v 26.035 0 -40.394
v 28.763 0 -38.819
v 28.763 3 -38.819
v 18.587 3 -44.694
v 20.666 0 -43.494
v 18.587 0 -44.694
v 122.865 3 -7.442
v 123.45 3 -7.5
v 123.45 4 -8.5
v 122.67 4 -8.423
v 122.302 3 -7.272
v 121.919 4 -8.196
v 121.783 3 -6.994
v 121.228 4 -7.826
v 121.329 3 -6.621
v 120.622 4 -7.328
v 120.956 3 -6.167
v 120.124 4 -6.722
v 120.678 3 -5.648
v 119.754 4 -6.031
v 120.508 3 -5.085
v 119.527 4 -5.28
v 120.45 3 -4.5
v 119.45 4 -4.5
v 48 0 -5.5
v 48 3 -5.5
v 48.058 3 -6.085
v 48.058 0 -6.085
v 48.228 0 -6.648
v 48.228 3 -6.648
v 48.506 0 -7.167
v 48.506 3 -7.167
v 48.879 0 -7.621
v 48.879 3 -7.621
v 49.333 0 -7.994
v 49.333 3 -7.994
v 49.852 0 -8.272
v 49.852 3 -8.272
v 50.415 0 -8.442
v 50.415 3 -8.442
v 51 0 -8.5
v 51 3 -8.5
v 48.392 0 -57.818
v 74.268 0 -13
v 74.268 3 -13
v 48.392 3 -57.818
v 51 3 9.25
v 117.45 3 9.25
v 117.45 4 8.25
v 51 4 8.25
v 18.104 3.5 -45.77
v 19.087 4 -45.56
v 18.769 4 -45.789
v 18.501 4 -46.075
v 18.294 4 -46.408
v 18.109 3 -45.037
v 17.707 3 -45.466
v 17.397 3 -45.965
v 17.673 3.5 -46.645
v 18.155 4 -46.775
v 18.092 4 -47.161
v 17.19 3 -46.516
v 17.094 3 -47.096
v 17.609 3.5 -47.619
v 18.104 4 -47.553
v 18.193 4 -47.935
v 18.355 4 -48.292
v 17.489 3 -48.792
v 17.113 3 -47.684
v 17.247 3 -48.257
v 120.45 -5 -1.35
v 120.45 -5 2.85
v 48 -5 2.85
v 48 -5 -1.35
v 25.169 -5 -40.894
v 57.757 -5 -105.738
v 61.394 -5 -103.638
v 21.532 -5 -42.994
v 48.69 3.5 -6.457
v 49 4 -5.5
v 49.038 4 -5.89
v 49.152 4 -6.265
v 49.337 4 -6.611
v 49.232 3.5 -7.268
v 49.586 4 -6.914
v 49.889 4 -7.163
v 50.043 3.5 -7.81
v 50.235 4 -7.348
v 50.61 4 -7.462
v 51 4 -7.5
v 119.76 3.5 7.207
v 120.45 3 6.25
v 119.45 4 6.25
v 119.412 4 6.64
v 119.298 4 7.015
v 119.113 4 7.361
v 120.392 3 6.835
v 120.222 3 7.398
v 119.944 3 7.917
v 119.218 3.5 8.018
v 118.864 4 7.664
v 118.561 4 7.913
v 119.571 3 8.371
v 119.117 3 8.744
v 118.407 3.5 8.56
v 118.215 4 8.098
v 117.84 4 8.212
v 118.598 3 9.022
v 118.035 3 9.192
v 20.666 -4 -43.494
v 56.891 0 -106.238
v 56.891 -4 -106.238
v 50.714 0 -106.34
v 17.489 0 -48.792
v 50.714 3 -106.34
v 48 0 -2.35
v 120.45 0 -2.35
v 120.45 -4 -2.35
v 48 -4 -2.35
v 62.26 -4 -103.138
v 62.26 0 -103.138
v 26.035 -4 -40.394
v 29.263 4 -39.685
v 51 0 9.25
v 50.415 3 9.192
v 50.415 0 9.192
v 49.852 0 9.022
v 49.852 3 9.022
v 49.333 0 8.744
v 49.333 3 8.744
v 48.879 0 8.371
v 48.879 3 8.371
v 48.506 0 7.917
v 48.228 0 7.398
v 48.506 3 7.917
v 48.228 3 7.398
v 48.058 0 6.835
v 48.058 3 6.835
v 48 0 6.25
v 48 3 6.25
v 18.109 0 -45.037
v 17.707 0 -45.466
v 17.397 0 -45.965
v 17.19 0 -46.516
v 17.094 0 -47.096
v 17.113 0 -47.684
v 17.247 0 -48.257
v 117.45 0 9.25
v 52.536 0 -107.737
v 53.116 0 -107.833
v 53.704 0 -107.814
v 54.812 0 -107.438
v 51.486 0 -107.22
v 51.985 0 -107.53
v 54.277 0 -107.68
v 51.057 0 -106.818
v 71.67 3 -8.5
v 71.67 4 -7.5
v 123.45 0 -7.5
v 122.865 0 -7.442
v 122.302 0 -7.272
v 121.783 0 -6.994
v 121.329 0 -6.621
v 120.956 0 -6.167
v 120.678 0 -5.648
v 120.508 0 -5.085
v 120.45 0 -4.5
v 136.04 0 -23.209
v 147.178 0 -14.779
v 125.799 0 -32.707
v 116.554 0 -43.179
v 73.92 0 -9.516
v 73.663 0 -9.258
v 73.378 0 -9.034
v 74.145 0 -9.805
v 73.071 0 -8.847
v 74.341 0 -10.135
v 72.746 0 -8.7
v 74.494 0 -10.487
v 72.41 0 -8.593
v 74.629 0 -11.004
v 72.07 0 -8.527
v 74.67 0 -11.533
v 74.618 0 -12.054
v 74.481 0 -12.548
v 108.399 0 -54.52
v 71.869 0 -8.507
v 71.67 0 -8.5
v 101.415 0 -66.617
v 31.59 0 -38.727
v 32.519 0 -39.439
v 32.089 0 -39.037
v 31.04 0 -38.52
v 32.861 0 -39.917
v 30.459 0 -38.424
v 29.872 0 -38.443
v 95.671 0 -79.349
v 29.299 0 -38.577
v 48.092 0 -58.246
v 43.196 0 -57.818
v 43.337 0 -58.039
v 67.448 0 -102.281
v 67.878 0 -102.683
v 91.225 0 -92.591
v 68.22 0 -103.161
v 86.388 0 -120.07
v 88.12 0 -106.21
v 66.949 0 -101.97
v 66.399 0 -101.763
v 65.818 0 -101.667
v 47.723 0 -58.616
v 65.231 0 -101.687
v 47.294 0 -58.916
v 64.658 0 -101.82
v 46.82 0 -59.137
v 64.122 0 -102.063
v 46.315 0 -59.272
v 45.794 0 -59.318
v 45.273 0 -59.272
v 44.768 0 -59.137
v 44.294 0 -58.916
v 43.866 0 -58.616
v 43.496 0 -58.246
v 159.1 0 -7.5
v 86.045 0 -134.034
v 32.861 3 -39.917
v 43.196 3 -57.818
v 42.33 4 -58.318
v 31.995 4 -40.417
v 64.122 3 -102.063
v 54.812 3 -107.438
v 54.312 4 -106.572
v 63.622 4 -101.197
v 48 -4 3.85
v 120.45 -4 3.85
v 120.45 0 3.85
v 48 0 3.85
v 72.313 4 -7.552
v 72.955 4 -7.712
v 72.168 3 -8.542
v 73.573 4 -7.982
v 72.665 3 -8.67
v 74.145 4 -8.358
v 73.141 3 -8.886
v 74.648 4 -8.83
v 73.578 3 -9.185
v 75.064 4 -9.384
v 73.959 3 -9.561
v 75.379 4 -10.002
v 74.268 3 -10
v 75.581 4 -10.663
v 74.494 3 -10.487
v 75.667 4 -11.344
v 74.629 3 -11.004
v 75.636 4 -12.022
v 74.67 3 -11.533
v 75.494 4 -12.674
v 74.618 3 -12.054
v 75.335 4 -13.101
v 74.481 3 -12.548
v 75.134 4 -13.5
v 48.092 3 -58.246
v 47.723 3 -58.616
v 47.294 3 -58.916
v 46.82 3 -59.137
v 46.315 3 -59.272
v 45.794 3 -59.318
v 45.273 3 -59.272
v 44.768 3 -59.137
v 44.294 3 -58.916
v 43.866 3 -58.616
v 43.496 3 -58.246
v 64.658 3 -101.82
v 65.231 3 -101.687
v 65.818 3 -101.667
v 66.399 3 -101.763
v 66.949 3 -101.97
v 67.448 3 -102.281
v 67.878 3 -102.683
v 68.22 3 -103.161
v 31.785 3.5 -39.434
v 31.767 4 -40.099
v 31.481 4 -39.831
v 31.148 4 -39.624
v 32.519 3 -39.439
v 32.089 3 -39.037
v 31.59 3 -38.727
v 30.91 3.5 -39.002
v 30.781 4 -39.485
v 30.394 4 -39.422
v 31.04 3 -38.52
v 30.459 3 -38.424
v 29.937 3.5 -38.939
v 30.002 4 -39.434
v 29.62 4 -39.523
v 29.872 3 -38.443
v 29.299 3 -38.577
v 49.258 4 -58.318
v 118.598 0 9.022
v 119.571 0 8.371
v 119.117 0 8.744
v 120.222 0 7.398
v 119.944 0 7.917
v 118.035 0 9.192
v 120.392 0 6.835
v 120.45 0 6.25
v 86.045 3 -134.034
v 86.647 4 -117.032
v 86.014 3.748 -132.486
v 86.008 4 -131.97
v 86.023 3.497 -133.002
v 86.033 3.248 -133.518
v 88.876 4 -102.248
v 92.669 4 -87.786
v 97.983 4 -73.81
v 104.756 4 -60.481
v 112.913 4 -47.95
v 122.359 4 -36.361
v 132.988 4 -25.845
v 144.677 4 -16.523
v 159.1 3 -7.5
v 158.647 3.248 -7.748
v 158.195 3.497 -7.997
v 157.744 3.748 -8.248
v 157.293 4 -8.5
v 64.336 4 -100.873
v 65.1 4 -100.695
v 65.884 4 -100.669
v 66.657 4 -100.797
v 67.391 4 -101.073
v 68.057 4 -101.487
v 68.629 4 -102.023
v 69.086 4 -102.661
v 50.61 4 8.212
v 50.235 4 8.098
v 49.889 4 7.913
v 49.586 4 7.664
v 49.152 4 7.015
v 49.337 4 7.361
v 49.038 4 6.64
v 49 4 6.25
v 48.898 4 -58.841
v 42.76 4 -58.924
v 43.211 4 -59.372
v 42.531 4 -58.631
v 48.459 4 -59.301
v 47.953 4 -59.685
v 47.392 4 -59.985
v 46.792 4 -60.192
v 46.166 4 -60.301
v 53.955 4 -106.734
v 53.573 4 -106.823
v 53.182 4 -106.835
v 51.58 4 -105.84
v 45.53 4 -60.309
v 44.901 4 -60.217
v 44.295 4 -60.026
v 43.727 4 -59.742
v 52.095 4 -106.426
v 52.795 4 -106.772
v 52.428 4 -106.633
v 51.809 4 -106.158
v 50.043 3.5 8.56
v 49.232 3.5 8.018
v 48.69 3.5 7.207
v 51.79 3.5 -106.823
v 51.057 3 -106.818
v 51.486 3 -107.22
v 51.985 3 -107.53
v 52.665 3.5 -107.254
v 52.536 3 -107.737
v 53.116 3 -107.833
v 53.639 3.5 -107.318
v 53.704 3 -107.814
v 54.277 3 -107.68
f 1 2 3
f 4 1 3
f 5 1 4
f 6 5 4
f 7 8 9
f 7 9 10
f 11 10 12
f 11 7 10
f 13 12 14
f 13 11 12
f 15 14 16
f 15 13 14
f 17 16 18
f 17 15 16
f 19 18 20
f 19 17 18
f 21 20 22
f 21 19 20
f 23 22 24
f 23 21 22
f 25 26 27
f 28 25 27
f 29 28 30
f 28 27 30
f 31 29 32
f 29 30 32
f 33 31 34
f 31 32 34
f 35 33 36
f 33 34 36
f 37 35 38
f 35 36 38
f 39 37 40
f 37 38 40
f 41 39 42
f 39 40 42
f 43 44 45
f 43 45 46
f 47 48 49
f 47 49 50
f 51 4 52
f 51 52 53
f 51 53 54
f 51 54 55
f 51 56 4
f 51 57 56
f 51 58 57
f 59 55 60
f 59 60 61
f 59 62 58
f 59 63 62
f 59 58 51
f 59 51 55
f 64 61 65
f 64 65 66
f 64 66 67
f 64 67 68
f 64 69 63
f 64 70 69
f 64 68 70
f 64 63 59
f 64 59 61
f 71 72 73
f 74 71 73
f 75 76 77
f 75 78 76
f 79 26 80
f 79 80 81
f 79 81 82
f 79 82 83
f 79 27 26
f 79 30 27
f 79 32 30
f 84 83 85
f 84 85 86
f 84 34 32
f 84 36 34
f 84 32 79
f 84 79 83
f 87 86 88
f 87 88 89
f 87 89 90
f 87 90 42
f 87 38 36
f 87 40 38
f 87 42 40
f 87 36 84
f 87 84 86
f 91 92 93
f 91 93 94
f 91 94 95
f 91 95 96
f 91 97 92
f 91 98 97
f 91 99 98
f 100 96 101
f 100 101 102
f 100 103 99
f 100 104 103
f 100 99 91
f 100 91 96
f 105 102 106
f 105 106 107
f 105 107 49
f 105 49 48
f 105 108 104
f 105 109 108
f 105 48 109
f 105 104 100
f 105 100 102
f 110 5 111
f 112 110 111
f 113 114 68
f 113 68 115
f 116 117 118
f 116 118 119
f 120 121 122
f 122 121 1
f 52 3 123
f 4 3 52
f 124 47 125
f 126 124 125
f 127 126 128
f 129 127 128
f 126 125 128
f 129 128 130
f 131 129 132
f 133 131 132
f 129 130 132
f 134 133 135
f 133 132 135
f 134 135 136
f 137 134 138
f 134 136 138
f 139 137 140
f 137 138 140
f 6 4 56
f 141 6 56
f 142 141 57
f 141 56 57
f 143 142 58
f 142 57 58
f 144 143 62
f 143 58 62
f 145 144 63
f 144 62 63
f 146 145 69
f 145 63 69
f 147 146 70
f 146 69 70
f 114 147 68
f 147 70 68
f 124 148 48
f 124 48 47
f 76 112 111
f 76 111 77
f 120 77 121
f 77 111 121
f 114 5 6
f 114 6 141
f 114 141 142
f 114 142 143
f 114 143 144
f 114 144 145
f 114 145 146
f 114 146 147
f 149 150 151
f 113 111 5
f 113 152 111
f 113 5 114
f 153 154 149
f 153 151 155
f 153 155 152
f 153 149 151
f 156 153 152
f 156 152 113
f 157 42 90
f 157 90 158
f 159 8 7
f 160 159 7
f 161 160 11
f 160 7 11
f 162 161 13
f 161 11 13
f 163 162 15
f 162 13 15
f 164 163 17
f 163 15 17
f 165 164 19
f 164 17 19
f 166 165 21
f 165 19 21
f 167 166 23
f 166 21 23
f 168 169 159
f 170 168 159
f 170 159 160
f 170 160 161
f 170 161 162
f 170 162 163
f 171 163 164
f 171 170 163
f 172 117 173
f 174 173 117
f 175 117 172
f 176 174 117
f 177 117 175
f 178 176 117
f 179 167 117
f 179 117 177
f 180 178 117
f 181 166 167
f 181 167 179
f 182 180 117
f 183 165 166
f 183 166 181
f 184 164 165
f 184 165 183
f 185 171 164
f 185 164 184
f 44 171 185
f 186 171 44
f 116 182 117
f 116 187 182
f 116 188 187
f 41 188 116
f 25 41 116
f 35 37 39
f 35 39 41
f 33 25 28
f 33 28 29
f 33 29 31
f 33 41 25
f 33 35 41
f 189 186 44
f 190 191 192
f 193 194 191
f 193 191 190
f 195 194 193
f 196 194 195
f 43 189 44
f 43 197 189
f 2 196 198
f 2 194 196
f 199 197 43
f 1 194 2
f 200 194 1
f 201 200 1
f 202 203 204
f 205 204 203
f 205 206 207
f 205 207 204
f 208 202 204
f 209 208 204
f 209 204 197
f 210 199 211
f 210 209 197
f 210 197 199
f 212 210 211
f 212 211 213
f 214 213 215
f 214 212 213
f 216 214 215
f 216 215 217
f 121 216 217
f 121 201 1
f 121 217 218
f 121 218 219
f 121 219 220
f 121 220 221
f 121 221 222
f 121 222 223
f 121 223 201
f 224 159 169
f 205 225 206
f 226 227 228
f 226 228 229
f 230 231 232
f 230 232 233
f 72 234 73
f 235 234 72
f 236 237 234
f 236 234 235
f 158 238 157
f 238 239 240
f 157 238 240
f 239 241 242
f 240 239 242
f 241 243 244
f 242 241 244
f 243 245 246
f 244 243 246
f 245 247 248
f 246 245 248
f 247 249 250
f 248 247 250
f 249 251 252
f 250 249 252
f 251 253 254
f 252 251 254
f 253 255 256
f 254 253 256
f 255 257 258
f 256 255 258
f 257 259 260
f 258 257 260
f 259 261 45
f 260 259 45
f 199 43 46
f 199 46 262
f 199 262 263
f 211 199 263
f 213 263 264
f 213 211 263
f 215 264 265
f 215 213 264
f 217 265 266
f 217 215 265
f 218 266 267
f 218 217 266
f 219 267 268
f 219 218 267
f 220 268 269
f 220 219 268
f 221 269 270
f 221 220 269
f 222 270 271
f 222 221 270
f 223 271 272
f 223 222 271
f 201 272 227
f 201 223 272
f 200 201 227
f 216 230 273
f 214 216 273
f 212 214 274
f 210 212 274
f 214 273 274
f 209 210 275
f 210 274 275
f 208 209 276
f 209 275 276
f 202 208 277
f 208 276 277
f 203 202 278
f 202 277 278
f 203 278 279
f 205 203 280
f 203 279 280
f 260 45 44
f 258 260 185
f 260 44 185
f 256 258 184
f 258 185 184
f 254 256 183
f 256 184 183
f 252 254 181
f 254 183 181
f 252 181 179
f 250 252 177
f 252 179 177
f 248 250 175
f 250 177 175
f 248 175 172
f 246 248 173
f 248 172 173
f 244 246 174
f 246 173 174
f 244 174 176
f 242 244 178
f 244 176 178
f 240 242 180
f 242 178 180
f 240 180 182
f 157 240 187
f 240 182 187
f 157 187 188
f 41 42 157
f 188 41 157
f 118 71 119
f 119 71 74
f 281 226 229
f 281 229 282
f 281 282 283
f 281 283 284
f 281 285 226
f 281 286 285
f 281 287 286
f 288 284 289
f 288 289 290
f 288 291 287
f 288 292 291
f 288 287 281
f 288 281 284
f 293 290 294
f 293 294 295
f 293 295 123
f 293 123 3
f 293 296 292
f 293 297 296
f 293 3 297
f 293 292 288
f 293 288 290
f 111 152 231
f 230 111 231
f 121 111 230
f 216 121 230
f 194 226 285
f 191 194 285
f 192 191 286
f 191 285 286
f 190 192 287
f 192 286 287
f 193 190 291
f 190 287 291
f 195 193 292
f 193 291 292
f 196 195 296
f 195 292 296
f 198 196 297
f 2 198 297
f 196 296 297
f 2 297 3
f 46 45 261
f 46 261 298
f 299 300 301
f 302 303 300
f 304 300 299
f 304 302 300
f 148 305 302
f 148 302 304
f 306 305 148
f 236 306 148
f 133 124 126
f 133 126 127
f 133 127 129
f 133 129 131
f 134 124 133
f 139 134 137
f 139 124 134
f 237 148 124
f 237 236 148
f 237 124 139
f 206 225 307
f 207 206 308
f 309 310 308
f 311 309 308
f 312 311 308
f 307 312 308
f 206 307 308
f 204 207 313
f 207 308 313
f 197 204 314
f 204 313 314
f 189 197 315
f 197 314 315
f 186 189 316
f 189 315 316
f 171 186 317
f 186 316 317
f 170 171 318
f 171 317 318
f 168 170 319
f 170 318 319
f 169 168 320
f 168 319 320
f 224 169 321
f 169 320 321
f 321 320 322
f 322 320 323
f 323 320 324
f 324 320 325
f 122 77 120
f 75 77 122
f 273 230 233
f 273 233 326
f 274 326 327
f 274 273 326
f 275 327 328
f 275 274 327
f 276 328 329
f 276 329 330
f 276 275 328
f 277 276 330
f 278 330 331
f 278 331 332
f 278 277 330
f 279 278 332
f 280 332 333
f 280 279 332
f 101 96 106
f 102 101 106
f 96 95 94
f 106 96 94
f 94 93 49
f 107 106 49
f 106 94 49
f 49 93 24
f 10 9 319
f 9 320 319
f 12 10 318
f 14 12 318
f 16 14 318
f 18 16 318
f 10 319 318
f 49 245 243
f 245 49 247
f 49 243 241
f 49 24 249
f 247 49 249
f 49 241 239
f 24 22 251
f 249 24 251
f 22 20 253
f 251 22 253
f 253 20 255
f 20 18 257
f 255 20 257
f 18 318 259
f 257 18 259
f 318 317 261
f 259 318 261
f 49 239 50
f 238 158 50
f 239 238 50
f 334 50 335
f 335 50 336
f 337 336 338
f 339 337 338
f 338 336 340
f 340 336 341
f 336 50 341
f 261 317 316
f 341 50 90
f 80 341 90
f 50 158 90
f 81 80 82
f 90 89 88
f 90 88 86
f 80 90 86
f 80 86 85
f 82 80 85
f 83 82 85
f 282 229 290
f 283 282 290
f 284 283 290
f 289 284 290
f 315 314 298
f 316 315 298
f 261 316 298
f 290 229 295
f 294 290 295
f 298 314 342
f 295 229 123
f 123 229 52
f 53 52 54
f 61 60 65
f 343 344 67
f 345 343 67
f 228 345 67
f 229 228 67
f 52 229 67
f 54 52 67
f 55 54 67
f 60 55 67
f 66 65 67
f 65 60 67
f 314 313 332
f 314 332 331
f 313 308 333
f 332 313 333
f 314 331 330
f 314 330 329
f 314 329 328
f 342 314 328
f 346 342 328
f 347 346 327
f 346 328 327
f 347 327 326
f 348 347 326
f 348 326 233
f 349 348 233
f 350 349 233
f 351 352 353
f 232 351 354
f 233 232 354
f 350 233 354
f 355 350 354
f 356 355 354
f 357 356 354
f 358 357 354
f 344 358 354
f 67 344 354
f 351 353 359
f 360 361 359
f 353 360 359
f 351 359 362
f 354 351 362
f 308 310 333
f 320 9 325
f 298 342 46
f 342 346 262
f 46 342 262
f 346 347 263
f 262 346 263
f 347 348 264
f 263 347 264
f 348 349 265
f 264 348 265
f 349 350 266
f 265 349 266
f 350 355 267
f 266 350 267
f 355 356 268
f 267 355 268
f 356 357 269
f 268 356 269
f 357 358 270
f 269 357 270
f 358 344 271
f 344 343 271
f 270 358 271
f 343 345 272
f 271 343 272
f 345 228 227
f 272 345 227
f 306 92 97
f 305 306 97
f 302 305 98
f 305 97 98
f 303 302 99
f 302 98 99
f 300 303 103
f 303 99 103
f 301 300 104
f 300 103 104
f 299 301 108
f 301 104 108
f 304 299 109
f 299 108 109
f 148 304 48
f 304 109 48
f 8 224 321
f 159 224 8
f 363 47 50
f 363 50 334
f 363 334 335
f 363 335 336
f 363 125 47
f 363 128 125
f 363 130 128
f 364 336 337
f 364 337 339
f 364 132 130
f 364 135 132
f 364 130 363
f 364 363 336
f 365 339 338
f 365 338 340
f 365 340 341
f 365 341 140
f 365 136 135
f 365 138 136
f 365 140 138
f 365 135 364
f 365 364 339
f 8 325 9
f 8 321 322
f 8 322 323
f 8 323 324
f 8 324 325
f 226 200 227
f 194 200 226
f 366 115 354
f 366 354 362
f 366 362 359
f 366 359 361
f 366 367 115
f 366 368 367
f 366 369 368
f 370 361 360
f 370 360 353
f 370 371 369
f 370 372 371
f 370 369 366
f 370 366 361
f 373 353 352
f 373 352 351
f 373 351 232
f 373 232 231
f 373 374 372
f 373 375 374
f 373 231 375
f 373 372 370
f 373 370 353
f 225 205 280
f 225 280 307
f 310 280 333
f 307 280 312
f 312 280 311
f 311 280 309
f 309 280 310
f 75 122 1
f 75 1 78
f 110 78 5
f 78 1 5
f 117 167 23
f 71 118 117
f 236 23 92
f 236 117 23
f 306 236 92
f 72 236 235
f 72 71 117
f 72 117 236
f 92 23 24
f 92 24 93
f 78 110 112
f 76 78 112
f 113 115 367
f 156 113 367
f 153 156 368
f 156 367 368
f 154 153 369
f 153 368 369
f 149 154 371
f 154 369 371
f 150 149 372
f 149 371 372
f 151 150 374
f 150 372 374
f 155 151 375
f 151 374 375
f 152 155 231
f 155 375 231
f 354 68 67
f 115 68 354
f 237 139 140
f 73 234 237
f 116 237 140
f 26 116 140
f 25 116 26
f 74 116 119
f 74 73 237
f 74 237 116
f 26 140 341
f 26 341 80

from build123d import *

# Parameters (mm, degrees)
BOSS_EXTRUDE1_DEPTH = 4
FILLET1_R           = 3
CUT_EXTRUDE1_DEPTH  = 5
FILLET4_R           = 3
CHAMFER1_SIZE       = 1
SKETCH3_R           = 140
CUT_EXTRUDE2_DEPTH  = 5
BOSS_EXTRUDE2_DEPTH = 5
CHAMFER2_SIZE       = 1


with BuildPart() as part:
    # Sketch1 → Boss-Extrude1 (new body)
    with BuildSketch(Plane(origin=(0, 0, 0), x_dir=(1, 0, 0), z_dir=(0, 1, 0))):
        Polygon((76, 10), (46.660254, 60.817931), (45.361216, 61.567931), (31.361216, 37.319219), (15.989265, 46.194219), (52.214265, 108.93776), (66.720191, 100.56276), (86.045101, 134.034486), (159.09982, 7.5), (120.45, 7.5), (120.45, -9.25), (48, -9.25), (48, 8.5), (76, 8.5), align=None)
    extrude(amount=BOSS_EXTRUDE1_DEPTH)

    # Fillet1
    fillet1_edges = [part.edges().sort_by_distance(p)[0] for p in [
        (48, 2, 9.25),
        (48, 2, -8.5),
        (31.361216, 2, -37.319219),
        (15.989265, 2, -46.194219),
        (52.214265, 2, -108.93776),
        (66.720191, 2, -100.56276),
        (120.45, 2, -7.5),
        (120.45, 2, 9.25),
    ]]
    fillet(fillet1_edges, radius=FILLET1_R)

    # Sketch2 → Cut-Extrude1 (cut, through all)
    with BuildSketch(Plane(origin=(0, 4, 0), x_dir=(1, 0, 0), z_dir=(0, 1, 0))):
        Polygon((46.660254, 60.817931), (45.794229, 62.317931), (45.361216, 61.567931), align=None)
        Polygon((76, 8.5), (76.866025, 8.5), (76, 10), align=None)
    extrude(amount=-CUT_EXTRUDE1_DEPTH, mode=Mode.SUBTRACT)

    # Fillet4
    fillet4_edges = [part.edges().sort_by_distance(p)[0] for p in [
        (45.794229, 2, -62.317931),
        (76.866025, 2, -8.5),
    ]]
    fillet(fillet4_edges, radius=FILLET4_R)

    # Chamfer1
    chamfer1_edges = [part.edges().sort_by_distance(p)[0] for p in [
        (61.330127, 4, -35.408965),
        (74.267949, 4, -10),
        (45.794229, 4, -59.317931),
        (23.67524, 4, -41.756719),
        (84.225, 4, 9.25),
        (120.45, 4, 0.875),
        (59.467228, 4, -104.75026),
        (34.101765, 4, -77.56599),
        (48, 4, 0.375),
        (119.57132, 4, 8.37132),
        (48.87868, 4, 8.37132),
        (48.87868, 4, -7.62132),
        (17.189564, 4, -46.515838),
        (52.535884, 4, -107.737461),
        (31.039597, 4, -38.519518),
        (66.398571, 4, -101.763059),
        (121.32868, 4, -6.62132),
    ]]
    chamfer(chamfer1_edges, length=CHAMFER1_SIZE)

    # Sketch3 → Cut-Extrude2 (cut, through all)
    with BuildSketch(Plane(origin=(0, 4, 0), x_dir=(1, 0, 0), z_dir=(0, 1, 0))):
        with Locations((226, 130.481161)):
            Circle(SKETCH3_R)
    extrude(amount=-CUT_EXTRUDE2_DEPTH, mode=Mode.SUBTRACT)

    # Sketch4 → Boss-Extrude2 (add)
    with BuildSketch(Plane.XZ):
        Polygon((20.665802, -43.494219), (56.890802, -106.23776), (62.26016, -103.13776), (26.03516, -40.394219), (23.350481, -41.944219), align=None)
        Polygon((48, 0.75), (48, 3.85), (120.45, 3.85), (120.45, -2.35), (48, -2.35), align=None)
    extrude(amount=BOSS_EXTRUDE2_DEPTH)

    # Chamfer2
    chamfer2_edges = [part.edges().sort_by_distance(p)[0] for p in [
        (84.225, -5, -2.35),
        (84.225, -5, 3.85),
        (38.778302, -5, -74.86599),
        (44.14766, -5, -71.76599),
    ]]
    chamfer(chamfer2_edges, length=CHAMFER2_SIZE)


solid = part.part
